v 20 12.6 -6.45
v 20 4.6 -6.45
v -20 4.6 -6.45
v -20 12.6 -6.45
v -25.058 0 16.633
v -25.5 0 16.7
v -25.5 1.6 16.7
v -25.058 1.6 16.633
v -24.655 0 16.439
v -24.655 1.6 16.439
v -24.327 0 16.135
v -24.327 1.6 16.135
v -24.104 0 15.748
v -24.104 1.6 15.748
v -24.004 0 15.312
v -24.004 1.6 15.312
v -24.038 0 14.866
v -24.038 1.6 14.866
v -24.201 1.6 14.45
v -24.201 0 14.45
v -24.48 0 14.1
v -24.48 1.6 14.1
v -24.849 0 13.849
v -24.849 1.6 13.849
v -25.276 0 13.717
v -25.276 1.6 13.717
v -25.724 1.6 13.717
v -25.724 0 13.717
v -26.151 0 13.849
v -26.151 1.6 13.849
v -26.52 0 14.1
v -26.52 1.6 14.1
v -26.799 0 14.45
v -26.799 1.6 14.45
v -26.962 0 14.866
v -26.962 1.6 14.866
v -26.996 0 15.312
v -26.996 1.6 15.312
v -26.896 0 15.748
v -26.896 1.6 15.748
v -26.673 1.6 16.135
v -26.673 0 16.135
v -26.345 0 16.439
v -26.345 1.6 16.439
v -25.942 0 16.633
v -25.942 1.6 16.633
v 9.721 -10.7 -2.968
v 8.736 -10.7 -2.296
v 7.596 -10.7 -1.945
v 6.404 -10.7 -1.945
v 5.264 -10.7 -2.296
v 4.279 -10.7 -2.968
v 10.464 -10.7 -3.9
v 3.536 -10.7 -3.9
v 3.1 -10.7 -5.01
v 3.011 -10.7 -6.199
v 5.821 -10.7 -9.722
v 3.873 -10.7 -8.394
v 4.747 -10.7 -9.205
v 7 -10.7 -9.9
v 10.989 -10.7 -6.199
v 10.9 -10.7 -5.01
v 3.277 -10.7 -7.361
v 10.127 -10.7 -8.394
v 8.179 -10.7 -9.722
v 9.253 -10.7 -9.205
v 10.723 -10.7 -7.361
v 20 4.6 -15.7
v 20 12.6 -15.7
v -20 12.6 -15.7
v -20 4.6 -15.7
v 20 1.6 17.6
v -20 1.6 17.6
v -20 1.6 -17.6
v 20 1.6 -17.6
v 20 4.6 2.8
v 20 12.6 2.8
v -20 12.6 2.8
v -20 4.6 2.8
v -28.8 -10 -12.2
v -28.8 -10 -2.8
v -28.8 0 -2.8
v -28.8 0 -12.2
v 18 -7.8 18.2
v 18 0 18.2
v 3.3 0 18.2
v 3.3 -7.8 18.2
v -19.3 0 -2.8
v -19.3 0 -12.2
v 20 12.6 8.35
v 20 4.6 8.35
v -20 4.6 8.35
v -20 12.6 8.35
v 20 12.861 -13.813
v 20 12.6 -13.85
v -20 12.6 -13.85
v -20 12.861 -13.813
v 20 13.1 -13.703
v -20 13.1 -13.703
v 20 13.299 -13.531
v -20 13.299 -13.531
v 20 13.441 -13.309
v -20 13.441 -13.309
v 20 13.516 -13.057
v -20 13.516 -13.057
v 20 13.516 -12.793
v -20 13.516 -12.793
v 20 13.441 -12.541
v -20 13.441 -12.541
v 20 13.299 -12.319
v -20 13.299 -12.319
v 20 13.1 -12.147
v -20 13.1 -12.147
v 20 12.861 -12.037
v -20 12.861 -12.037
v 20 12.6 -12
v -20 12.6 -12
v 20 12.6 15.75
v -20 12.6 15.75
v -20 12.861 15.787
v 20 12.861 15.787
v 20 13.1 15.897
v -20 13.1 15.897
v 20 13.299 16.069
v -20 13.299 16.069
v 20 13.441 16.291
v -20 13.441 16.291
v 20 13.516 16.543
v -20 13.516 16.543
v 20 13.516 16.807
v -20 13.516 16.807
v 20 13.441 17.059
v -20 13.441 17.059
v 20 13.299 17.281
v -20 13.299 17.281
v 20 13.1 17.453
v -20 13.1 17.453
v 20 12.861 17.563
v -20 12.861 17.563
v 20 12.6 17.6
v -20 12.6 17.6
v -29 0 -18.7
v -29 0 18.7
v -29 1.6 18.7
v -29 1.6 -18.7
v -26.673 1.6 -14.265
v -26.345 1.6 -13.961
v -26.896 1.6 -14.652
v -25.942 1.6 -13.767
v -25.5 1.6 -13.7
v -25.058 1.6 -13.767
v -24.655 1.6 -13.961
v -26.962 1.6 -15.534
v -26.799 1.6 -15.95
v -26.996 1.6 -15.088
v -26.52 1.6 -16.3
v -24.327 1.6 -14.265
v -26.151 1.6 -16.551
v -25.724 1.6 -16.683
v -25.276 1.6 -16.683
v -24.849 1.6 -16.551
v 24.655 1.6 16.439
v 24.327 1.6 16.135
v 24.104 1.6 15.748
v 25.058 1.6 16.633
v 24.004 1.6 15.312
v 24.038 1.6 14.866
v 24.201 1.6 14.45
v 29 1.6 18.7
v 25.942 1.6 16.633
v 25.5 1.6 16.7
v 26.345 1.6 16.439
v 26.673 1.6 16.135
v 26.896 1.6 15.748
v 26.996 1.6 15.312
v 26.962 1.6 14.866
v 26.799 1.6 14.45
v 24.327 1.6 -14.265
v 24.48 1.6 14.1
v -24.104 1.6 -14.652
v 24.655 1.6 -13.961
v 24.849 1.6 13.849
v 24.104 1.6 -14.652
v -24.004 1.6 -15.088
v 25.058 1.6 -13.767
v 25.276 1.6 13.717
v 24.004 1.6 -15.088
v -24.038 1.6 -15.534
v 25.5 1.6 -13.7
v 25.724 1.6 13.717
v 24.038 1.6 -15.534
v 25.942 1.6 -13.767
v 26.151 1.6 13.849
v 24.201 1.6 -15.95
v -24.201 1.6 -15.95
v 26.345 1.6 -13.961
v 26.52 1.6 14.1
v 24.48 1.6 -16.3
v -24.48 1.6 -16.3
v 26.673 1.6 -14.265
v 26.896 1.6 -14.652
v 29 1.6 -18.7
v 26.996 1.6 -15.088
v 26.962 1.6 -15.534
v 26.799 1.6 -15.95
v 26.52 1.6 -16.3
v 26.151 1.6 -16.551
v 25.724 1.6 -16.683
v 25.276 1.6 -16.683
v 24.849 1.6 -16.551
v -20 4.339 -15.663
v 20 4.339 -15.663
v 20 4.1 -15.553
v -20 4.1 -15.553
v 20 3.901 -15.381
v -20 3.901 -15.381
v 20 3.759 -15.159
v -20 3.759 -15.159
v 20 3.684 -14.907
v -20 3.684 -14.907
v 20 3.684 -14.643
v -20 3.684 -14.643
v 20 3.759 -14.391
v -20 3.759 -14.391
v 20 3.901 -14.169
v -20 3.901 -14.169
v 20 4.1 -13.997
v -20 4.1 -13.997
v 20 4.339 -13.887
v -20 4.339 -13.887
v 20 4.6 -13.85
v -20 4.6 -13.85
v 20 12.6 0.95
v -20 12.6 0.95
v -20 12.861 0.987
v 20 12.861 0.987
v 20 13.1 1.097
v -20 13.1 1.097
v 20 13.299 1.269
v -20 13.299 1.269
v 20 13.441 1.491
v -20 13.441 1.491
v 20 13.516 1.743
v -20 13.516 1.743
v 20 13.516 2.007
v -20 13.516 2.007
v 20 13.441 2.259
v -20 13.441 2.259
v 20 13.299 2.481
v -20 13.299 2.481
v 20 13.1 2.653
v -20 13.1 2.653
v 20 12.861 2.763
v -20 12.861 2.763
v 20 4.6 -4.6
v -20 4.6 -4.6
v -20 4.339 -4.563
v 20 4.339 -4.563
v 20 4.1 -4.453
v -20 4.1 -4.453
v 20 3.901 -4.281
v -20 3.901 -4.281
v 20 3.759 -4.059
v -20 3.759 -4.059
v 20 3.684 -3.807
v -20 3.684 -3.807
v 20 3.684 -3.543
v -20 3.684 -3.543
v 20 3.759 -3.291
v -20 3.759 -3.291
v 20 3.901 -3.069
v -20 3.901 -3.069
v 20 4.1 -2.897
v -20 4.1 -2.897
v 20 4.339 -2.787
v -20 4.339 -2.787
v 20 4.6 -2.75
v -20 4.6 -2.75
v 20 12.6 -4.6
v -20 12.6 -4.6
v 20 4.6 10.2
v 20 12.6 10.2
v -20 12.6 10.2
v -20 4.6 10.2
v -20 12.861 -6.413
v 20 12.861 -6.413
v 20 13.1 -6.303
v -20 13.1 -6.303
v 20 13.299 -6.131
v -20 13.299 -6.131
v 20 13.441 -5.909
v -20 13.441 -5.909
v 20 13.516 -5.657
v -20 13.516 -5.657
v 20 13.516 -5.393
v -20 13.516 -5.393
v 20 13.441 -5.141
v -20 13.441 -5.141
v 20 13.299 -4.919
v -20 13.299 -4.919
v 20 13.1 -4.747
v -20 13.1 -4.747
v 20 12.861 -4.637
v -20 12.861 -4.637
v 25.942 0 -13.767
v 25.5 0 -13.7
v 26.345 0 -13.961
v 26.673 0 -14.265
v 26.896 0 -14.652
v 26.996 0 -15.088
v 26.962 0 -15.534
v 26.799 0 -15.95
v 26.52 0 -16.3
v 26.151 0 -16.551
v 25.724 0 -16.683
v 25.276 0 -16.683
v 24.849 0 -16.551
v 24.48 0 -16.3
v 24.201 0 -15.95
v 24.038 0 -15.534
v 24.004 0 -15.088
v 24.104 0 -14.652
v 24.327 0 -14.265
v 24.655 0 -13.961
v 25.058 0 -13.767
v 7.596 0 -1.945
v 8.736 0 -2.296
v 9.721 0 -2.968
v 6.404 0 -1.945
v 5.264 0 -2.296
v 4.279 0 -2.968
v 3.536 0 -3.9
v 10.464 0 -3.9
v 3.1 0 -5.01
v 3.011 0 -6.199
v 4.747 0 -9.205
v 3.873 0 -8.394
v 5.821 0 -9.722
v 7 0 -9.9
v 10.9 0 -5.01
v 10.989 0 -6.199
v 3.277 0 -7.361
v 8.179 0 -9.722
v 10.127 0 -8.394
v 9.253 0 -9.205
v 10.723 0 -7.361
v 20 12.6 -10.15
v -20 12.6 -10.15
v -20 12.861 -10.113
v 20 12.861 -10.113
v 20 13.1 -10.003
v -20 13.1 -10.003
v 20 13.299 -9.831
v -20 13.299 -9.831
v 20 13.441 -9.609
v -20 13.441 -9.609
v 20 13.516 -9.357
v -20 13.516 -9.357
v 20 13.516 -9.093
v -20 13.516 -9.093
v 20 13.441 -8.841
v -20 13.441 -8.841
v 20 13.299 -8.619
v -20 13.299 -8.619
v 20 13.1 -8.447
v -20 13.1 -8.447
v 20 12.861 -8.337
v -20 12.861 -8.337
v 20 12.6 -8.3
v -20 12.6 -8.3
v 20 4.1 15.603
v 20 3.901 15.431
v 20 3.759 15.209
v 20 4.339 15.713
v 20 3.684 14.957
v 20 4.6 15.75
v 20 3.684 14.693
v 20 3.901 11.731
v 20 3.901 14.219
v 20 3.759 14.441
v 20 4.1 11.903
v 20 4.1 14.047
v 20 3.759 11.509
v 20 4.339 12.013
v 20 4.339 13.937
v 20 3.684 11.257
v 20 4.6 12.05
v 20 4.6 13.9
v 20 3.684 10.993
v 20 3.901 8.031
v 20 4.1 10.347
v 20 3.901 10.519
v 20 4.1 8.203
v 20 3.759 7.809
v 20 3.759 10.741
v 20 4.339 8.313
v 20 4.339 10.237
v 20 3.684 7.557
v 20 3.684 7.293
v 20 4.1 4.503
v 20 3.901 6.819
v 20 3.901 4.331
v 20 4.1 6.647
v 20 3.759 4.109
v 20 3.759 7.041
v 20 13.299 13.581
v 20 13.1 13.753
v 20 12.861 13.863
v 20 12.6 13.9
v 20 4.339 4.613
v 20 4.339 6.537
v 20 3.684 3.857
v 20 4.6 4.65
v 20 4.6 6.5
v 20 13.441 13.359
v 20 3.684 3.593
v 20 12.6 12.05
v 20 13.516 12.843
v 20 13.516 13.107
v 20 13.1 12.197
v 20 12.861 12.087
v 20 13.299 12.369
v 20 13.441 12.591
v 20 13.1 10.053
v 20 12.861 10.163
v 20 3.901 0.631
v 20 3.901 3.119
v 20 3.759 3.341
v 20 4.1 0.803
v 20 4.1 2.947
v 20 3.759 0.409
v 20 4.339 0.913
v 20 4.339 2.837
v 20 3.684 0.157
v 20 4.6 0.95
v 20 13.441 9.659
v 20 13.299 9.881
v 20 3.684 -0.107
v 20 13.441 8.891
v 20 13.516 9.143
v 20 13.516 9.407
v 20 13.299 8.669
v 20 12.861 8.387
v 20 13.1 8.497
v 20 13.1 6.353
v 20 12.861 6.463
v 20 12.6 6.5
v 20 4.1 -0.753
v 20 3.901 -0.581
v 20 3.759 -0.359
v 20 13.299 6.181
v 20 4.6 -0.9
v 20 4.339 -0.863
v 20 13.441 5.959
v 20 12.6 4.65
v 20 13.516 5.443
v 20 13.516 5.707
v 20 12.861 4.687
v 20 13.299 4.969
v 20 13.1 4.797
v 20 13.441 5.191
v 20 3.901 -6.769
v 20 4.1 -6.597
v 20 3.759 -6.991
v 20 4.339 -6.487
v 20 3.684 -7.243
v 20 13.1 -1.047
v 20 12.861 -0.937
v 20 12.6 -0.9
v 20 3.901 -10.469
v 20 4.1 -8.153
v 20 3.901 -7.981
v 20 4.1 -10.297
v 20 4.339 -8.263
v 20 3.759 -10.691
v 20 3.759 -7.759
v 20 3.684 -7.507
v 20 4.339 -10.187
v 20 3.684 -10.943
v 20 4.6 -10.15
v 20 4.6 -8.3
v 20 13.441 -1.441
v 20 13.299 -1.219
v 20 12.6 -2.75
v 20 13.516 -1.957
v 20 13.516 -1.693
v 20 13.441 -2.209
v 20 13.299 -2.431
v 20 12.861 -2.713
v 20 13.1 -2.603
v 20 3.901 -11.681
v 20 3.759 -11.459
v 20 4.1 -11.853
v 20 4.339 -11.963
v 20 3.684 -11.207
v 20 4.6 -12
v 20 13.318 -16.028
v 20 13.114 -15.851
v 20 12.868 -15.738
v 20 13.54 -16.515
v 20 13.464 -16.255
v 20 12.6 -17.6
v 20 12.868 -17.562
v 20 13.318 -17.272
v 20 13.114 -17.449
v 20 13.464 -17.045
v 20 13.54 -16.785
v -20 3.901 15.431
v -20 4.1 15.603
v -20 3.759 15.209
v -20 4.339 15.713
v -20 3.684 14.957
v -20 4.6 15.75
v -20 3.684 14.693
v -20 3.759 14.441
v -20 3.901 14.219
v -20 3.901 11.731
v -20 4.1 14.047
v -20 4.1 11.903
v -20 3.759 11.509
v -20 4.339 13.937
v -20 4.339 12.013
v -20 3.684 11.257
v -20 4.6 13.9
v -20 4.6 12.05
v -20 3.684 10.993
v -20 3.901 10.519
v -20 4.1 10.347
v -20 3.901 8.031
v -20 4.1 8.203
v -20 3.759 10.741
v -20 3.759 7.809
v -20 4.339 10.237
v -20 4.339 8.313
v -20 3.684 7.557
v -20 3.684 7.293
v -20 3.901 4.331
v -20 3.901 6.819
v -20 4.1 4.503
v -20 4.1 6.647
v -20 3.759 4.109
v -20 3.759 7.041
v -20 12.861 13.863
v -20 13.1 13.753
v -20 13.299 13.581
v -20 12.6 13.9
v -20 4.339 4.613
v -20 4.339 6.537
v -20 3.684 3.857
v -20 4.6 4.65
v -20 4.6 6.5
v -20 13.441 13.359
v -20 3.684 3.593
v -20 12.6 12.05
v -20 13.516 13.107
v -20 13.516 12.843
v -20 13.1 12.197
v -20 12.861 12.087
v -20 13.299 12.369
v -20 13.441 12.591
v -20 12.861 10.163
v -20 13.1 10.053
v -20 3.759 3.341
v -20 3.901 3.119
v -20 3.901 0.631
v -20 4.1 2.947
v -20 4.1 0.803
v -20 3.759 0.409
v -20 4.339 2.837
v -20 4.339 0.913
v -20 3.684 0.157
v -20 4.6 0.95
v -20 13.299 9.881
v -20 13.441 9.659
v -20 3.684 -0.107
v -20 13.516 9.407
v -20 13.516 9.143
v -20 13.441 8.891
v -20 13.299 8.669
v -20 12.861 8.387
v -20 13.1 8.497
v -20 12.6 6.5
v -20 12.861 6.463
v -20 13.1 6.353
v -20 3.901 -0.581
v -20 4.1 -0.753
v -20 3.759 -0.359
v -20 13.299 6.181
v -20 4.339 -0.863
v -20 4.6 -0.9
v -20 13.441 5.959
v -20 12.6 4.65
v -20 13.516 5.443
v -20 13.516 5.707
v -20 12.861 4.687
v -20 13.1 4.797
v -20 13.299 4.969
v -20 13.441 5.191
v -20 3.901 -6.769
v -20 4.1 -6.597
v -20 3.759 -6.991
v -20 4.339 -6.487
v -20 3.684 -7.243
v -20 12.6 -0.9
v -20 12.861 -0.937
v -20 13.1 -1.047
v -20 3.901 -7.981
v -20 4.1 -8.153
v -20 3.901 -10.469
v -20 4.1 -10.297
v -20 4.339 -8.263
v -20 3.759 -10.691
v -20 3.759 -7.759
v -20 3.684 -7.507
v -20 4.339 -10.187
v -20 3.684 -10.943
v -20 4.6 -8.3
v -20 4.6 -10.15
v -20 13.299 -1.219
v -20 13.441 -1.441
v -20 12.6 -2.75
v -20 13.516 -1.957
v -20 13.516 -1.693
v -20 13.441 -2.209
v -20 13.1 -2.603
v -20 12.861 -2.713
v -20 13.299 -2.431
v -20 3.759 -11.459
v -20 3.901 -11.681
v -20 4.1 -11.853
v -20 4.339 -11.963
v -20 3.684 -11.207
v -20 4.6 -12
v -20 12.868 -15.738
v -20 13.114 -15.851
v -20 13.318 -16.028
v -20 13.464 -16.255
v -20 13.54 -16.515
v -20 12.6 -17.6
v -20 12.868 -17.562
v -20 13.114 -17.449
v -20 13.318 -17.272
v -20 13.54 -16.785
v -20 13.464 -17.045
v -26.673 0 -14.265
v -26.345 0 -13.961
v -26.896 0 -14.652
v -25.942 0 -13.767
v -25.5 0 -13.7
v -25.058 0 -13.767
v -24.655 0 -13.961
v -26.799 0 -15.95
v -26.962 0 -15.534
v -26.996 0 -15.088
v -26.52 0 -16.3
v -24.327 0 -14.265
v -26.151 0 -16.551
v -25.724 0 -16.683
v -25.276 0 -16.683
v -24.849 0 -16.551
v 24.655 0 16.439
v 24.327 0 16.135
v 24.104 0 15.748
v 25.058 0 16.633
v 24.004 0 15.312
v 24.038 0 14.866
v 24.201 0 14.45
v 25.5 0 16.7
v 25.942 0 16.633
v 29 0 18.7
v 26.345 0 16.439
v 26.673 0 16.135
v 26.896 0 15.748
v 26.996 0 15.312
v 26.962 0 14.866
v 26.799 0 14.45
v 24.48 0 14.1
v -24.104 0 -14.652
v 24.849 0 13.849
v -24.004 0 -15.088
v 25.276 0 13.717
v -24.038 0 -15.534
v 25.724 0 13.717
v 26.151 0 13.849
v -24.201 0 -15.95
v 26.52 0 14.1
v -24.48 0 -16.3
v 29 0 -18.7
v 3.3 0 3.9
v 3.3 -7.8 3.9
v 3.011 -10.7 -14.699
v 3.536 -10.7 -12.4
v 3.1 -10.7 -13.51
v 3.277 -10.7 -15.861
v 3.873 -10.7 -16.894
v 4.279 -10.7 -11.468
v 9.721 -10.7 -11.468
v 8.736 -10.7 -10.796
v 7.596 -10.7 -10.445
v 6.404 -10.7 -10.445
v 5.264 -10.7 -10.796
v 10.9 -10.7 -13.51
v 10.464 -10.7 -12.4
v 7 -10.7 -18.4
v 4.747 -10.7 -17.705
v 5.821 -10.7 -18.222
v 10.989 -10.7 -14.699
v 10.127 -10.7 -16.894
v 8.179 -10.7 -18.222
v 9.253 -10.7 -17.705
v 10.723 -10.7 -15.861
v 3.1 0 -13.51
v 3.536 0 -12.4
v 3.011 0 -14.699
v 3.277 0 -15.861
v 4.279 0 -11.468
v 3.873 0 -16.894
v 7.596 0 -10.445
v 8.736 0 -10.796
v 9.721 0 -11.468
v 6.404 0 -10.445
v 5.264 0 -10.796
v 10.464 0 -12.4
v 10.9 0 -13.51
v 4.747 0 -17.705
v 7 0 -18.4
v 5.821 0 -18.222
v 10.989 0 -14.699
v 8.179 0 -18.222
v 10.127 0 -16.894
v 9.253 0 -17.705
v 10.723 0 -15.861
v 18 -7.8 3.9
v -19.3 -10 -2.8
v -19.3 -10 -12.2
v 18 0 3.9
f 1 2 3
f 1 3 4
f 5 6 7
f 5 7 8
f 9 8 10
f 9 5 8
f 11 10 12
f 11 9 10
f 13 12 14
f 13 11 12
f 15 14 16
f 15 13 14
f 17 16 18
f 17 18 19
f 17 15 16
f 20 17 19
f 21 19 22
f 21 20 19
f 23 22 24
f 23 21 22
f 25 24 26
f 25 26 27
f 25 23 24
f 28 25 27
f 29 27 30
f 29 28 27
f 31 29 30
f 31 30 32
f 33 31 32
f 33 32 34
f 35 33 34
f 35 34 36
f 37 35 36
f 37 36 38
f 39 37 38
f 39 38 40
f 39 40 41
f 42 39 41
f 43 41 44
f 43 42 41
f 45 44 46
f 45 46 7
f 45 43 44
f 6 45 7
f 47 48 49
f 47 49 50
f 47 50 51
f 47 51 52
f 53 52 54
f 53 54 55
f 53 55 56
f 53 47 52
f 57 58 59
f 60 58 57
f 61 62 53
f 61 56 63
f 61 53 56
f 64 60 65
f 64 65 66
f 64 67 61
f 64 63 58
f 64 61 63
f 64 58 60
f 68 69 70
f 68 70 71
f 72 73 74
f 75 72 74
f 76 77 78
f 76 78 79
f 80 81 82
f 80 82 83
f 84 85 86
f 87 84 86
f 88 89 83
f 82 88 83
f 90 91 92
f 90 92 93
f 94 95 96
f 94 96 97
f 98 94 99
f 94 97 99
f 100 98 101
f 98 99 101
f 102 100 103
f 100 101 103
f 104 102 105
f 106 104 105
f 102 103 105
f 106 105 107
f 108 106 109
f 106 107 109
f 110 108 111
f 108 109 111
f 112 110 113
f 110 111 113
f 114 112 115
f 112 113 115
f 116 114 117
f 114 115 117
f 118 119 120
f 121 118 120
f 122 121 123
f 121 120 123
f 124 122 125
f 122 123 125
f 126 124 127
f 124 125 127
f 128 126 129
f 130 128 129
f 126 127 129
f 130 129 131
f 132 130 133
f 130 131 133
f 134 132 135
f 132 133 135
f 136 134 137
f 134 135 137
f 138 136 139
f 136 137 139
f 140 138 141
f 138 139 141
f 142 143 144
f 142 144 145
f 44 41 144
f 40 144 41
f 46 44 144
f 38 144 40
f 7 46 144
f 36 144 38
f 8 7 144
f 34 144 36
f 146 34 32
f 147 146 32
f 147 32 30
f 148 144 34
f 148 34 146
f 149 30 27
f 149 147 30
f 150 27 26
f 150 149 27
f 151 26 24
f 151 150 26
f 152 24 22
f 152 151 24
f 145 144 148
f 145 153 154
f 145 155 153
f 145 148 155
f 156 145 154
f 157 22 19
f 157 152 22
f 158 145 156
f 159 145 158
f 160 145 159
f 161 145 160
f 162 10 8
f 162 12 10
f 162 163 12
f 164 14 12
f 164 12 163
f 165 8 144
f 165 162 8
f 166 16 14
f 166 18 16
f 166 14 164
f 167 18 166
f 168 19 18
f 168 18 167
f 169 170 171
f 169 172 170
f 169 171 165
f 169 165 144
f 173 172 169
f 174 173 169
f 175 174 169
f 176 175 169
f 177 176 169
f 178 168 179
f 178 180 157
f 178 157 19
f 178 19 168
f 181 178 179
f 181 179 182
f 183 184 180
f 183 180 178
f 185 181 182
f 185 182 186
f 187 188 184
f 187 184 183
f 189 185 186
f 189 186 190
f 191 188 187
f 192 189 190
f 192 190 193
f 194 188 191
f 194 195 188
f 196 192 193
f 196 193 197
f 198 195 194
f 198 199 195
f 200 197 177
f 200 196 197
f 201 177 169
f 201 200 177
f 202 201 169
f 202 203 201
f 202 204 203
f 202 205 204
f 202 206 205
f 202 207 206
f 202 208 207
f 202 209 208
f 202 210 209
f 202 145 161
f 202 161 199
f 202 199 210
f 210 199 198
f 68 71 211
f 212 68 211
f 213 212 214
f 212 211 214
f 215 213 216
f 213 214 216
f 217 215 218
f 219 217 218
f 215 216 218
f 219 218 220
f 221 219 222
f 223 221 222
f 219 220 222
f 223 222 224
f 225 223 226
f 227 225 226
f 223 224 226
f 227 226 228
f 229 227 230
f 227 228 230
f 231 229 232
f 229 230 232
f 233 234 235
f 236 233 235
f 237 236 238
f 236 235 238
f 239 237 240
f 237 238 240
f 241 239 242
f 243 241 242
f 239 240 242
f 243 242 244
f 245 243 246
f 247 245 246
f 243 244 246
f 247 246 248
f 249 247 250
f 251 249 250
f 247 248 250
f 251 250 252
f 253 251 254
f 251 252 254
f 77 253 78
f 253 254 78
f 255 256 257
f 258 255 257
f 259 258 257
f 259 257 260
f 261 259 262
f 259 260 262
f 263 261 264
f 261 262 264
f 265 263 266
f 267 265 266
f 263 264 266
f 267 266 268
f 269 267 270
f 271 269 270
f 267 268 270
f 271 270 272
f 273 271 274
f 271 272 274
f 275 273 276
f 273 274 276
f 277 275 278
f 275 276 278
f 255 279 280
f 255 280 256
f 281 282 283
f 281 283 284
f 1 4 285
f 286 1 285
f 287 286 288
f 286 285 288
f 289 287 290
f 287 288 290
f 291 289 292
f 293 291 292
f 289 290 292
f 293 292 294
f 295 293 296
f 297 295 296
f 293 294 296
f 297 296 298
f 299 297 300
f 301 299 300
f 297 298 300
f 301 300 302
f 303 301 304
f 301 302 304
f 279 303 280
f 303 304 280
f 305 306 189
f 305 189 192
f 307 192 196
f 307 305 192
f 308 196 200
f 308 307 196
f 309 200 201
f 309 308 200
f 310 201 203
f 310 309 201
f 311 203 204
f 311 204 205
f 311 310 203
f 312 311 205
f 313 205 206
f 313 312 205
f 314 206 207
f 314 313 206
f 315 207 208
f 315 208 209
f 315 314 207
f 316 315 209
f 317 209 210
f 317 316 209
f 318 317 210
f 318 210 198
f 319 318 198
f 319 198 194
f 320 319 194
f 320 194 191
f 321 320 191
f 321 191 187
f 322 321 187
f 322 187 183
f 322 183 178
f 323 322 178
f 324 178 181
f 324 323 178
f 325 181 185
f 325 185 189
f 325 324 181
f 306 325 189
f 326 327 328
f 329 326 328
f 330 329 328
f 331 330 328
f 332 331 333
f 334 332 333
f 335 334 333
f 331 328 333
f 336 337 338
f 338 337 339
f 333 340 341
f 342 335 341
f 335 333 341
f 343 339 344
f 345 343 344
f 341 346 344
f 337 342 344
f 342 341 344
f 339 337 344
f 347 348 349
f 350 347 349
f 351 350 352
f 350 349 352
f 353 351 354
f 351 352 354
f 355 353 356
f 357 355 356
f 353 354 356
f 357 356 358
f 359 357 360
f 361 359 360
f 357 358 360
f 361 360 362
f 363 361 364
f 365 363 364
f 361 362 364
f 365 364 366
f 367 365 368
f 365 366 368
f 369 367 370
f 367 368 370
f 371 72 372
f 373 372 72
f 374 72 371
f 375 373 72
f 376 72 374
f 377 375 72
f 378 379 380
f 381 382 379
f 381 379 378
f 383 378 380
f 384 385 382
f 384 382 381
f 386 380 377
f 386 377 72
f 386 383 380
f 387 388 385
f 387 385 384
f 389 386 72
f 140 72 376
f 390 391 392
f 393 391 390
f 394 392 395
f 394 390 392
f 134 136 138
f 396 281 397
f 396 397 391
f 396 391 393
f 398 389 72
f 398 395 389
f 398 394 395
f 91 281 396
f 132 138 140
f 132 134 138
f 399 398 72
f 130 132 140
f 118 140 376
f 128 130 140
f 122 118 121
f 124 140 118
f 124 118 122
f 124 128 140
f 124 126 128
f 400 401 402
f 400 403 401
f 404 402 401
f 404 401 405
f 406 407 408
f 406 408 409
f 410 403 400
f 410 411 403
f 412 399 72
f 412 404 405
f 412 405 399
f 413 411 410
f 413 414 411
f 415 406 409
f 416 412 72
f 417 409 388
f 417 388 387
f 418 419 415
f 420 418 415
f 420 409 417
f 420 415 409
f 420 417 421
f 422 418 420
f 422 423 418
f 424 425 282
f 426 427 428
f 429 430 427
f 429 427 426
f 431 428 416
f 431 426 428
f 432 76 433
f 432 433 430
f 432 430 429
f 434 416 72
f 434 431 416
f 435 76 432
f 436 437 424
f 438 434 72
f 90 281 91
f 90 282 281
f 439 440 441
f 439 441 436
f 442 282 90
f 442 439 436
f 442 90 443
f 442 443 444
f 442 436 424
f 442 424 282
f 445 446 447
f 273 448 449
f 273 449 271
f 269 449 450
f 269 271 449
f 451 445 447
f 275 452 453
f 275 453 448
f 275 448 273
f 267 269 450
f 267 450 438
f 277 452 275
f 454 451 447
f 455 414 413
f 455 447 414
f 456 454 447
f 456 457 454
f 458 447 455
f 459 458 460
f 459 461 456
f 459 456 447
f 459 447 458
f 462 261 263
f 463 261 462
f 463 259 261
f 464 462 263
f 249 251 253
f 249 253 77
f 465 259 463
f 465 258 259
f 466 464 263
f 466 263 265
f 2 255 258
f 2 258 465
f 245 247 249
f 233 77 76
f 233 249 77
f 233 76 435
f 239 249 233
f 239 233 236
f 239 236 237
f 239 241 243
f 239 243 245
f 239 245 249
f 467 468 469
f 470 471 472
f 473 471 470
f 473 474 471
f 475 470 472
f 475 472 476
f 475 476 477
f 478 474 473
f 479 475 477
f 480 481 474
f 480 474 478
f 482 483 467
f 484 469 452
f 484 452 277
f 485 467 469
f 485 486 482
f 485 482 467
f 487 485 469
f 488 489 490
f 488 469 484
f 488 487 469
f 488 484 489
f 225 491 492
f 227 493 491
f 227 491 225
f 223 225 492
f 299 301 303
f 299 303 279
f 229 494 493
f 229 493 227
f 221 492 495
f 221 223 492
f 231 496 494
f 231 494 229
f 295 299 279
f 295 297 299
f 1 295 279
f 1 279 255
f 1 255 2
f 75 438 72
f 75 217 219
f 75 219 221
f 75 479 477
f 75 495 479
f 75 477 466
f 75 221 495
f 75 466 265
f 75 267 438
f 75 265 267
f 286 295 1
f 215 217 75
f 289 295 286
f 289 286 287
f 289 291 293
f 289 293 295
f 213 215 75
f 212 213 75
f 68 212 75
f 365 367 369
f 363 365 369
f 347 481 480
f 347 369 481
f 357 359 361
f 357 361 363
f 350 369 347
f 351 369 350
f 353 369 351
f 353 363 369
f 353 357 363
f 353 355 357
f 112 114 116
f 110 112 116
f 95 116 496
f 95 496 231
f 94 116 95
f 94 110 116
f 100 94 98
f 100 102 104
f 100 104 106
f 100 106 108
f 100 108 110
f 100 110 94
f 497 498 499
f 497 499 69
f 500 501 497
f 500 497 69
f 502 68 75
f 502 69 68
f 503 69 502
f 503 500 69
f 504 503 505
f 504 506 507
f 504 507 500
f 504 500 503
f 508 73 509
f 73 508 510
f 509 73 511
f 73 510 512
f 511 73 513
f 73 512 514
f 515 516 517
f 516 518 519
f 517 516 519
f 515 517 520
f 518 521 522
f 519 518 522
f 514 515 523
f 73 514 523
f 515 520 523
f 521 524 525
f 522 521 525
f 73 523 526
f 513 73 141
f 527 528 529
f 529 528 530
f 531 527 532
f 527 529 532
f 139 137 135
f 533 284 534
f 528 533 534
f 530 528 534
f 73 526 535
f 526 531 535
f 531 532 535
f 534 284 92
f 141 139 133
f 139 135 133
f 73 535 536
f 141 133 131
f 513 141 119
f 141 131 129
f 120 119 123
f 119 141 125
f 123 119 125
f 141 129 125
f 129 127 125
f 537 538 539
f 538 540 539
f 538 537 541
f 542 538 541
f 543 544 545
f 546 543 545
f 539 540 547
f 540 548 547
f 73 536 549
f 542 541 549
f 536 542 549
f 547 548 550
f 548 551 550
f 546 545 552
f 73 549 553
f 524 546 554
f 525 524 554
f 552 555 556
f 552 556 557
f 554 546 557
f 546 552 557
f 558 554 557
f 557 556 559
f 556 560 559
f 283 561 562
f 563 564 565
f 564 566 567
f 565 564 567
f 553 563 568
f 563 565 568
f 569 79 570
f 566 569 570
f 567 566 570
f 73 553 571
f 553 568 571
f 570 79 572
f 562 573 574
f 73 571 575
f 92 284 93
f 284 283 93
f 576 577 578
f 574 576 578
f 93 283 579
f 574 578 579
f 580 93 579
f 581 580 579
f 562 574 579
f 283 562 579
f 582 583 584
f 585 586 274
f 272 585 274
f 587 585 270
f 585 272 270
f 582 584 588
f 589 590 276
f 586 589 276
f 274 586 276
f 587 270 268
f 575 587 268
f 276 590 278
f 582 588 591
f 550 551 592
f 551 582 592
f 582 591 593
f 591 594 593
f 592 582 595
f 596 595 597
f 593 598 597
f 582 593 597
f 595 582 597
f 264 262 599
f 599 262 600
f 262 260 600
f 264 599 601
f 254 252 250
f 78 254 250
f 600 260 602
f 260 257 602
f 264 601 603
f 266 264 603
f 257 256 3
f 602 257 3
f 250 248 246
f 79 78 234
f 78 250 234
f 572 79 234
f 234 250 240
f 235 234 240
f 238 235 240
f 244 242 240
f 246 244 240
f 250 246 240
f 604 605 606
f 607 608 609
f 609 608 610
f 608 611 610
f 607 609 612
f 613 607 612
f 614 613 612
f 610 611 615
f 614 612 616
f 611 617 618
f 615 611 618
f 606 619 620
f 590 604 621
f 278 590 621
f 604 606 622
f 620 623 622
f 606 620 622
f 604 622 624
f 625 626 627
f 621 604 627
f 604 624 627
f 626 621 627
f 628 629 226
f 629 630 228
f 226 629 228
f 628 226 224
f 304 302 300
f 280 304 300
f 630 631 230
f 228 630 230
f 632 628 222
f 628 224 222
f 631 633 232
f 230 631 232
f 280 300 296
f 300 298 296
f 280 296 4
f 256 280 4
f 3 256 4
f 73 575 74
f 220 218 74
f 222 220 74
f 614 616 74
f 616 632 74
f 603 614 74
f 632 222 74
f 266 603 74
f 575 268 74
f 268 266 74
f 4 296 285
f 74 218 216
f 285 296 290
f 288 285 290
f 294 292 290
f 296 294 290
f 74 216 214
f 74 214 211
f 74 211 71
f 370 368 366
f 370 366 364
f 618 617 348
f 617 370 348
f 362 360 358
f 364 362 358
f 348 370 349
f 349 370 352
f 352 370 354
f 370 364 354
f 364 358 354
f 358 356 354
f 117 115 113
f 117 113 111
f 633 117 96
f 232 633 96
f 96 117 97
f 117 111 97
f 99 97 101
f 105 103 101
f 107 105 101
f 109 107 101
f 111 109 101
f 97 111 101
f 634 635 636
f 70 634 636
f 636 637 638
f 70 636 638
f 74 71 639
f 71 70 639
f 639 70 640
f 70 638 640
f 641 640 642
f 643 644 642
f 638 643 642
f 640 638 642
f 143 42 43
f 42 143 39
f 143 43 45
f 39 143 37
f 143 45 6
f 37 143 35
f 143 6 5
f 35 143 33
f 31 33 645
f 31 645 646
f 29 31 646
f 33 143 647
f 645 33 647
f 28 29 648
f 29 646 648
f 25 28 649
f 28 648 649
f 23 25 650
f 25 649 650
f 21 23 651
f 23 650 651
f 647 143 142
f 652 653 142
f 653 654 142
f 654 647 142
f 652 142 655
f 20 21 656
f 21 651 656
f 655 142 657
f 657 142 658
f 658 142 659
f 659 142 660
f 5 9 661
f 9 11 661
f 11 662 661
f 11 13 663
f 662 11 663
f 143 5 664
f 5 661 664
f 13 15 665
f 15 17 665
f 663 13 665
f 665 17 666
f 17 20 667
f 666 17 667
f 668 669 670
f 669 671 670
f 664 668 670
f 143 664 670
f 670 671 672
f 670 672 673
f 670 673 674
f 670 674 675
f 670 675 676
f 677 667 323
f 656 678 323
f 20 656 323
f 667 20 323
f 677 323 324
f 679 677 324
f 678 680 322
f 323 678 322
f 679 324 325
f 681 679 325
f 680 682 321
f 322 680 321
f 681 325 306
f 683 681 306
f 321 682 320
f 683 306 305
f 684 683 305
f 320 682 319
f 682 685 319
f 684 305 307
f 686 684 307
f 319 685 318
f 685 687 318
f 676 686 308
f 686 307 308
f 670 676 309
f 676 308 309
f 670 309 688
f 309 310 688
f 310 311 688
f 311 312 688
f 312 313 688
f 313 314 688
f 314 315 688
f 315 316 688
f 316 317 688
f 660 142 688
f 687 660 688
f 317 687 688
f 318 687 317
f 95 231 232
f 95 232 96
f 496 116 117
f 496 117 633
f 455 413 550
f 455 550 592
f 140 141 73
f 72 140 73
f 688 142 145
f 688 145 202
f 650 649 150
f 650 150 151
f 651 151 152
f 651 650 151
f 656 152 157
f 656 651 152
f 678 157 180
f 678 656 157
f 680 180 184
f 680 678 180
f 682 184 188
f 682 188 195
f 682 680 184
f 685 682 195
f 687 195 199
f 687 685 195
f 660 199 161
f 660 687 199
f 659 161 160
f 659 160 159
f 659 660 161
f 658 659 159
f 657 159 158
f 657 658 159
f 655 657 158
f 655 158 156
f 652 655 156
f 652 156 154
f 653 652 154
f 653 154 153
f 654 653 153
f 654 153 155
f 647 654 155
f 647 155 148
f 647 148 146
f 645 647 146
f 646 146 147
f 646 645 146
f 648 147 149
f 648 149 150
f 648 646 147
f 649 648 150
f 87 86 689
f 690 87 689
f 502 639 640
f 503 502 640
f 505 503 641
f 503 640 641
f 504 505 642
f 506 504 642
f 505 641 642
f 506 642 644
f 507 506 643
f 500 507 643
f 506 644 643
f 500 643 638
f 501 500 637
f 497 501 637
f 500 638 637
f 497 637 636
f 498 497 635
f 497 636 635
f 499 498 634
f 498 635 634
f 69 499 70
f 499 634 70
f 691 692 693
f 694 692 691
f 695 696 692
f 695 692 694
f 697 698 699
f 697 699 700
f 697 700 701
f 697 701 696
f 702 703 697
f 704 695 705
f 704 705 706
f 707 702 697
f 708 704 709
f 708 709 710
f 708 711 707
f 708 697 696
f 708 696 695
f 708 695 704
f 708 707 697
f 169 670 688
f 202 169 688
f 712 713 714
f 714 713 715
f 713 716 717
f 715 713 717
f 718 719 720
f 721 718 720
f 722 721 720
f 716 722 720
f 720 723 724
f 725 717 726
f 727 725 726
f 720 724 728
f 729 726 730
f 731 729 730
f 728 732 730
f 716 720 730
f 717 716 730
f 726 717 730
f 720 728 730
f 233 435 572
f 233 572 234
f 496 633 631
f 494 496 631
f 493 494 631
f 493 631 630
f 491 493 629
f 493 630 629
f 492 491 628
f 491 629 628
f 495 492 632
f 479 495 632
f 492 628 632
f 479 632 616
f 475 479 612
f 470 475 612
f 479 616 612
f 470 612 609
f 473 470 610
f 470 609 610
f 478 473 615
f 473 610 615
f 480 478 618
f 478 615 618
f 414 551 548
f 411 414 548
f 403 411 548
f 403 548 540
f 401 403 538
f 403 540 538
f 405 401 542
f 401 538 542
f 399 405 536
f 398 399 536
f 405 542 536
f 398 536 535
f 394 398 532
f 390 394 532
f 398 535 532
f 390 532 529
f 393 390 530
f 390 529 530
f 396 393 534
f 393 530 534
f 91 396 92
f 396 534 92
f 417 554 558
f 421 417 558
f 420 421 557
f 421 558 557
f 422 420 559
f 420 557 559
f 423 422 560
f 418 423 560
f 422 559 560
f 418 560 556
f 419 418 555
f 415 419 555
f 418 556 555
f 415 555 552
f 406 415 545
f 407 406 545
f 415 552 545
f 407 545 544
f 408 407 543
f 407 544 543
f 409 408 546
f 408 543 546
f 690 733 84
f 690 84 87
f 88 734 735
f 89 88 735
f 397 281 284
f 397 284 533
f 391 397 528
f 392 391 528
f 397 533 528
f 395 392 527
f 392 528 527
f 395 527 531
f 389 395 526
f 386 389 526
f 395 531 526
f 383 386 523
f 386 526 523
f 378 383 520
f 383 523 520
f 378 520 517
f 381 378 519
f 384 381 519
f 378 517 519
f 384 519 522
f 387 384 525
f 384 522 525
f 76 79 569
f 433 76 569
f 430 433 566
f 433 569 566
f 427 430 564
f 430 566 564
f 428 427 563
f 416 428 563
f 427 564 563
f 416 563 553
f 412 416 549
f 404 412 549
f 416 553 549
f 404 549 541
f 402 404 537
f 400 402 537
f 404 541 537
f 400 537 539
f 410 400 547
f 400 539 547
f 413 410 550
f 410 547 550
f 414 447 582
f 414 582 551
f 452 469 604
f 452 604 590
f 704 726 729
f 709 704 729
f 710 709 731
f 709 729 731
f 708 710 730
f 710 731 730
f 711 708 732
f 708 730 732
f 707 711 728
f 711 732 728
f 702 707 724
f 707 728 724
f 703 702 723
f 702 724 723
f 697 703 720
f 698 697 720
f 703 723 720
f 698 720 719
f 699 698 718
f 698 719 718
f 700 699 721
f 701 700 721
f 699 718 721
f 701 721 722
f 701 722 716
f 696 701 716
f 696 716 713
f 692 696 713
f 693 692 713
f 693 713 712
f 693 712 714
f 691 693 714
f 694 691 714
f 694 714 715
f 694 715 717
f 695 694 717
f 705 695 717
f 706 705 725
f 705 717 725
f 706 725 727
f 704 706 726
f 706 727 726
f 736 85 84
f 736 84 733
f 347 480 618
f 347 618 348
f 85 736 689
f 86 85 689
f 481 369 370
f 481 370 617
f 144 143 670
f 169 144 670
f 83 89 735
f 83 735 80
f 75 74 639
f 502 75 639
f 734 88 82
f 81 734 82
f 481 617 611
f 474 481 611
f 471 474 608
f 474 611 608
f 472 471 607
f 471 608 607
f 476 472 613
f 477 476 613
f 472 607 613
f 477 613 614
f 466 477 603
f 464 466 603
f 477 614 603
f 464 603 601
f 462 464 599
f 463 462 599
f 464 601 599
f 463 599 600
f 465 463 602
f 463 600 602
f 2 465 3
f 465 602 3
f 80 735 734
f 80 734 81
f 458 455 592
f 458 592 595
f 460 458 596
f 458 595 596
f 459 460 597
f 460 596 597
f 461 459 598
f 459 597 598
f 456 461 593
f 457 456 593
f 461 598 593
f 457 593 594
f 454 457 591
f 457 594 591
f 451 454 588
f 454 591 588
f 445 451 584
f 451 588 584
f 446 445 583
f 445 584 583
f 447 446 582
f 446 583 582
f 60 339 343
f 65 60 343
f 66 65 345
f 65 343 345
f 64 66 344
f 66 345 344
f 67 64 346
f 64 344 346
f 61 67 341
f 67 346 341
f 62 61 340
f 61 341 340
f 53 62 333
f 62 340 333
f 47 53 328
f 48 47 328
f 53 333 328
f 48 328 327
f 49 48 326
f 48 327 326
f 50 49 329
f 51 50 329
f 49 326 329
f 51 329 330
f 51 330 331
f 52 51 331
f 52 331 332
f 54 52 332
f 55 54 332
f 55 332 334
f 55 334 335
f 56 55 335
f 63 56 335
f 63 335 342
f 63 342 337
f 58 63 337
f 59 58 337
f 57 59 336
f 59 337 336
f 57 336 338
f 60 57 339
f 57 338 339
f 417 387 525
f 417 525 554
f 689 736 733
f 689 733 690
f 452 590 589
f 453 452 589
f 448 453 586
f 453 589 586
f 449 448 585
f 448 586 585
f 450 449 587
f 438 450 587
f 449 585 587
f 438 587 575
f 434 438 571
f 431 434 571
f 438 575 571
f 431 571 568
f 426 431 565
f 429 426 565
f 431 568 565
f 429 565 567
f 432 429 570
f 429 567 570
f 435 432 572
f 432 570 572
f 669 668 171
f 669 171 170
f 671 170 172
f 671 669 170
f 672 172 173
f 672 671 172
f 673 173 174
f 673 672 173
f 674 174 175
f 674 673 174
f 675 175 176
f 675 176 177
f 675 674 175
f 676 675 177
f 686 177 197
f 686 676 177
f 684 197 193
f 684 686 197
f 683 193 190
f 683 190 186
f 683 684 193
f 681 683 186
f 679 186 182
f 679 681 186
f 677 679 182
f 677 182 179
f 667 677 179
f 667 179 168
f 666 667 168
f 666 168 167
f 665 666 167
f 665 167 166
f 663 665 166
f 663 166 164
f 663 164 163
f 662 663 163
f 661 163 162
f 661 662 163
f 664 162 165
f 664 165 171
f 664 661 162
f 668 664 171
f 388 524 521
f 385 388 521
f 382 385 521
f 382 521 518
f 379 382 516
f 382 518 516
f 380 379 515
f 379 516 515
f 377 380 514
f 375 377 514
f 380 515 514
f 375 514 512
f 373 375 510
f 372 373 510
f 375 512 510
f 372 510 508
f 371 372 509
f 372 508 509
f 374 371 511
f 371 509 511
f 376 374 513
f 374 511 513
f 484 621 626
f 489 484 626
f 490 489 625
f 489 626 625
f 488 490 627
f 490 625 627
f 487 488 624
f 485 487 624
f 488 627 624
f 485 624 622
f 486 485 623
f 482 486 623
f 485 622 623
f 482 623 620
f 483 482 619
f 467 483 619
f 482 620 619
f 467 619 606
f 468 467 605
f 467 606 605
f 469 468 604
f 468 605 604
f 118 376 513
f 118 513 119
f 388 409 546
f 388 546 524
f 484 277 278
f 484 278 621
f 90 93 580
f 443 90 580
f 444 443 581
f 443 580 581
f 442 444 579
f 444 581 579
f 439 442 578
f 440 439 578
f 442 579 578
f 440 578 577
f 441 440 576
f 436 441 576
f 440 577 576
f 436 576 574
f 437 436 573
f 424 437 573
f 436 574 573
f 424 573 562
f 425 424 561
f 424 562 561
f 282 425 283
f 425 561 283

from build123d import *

# Parameters (mm, degrees)
SKETCH1_W                = 58
SKETCH1_H                = 37.4
SKETCH1_R                = 1.5
BOSS_EXTRUDE1_DEPTH      = 1.6
BOSS_EXTRUDE2_DEPTH      = 20
BOSS_EXTRUDE2_DEPTH_BACK = 20
SKETCH3_W                = 14.7
SKETCH3_H                = 14.3
BOSS_EXTRUDE3_DEPTH      = 7.8
SKETCH4_R                = 4
BOSS_EXTRUDE4_DEPTH      = 10.7
BOSS_EXTRUDE4_2_DEPTH    = 10.7
SKETCH5_W                = 9.5
SKETCH5_H                = 9.4
BOSS_EXTRUDE5_DEPTH      = 10


with BuildPart() as part:
    # Sketch1 → Boss-Extrude1 (new body)
    with BuildSketch(Plane(origin=(0, 0, 0), x_dir=(1, 0, 0), z_dir=(0, 1, 0))):
        Rectangle(SKETCH1_W, SKETCH1_H)
        with Locations(Location((25.5, 15.2, 0), (0, 0, 270))):
            Circle(SKETCH1_R, mode=Mode.SUBTRACT)
        with Locations(Location((25.5, -15.2, 0), (0, 0, 270))):
            Circle(SKETCH1_R, mode=Mode.SUBTRACT)
        with Locations(Location((-25.5, -15.2, 0), (0, 0, 270))):
            Circle(SKETCH1_R, mode=Mode.SUBTRACT)
        with Locations(Location((-25.5, 15.2, 0), (0, 0, 270))):
            Circle(SKETCH1_R, mode=Mode.SUBTRACT)
    extrude(amount=BOSS_EXTRUDE1_DEPTH)


with BuildPart() as body_2:
    # Sketch2 → Boss-Extrude2 (new, two sides: drawn at the far end of the back side and taken through both)
    with BuildSketch(Plane(origin=(0, 0, 0), x_dir=(0, 0, -1), z_dir=(1, 0, 0)).offset(-BOSS_EXTRUDE2_DEPTH_BACK)):
        with BuildLine():
            Line((-17.6, 12.6), (-17.6, 1.6))
            Line((-17.6, 1.6), (17.6, 1.6))
            Line((17.6, 1.6), (17.6, 12.6))
            ThreePointArc((17.6, 12.6), (16.65, 13.55), (15.7, 12.6))
            Line((15.7, 12.6), (15.7, 4.6))
            ThreePointArc((15.7, 4.6), (14.775, 3.675), (13.85, 4.6))
            Line((13.85, 4.6), (13.85, 12.6))
            ThreePointArc((13.85, 12.6), (12.925, 13.525), (12, 12.6))
            Line((12, 12.6), (12, 4.6))
            ThreePointArc((12, 4.6), (11.075, 3.675), (10.15, 4.6))
            Line((10.15, 4.6), (10.15, 12.6))
            ThreePointArc((10.15, 12.6), (9.225, 13.525), (8.3, 12.6))
            Line((8.3, 12.6), (8.3, 4.6))
            ThreePointArc((8.3, 4.6), (7.375, 3.675), (6.45, 4.6))
            Line((6.45, 4.6), (6.45, 12.6))
            ThreePointArc((6.45, 12.6), (5.525, 13.525), (4.6, 12.6))
            Line((4.6, 12.6), (4.6, 4.6))
            ThreePointArc((4.6, 4.6), (3.675, 3.675), (2.75, 4.6))
            Line((2.75, 4.6), (2.75, 12.6))
            ThreePointArc((2.75, 12.6), (1.825, 13.525), (0.9, 12.6))
            Line((0.9, 12.6), (0.9, 4.6))
            ThreePointArc((0.9, 4.6), (-0.025, 3.675), (-0.95, 4.6))
            Line((-0.95, 4.6), (-0.95, 12.6))
            ThreePointArc((-0.95, 12.6), (-1.875, 13.525), (-2.8, 12.6))
            Line((-2.8, 12.6), (-2.8, 4.6))
            ThreePointArc((-2.8, 4.6), (-3.725, 3.675), (-4.65, 4.6))
            Line((-4.65, 4.6), (-4.65, 12.6))
            ThreePointArc((-4.65, 12.6), (-5.575, 13.525), (-6.5, 12.6))
            Line((-6.5, 12.6), (-6.5, 4.6))
            ThreePointArc((-6.5, 4.6), (-7.425, 3.675), (-8.35, 4.6))
            Line((-8.35, 4.6), (-8.35, 12.6))
            ThreePointArc((-8.35, 12.6), (-9.275, 13.525), (-10.2, 12.6))
            Line((-10.2, 12.6), (-10.2, 4.6))
            ThreePointArc((-10.2, 4.6), (-11.125, 3.675), (-12.05, 4.6))
            Line((-12.05, 4.6), (-12.05, 12.6))
            Line((-12.05, 12.6), (-13.9, 12.6))
            Line((-13.9, 12.6), (-13.9, 4.6))
            ThreePointArc((-13.9, 4.6), (-14.825, 3.675), (-15.75, 4.6))
            Line((-15.75, 4.6), (-15.75, 12.6))
            ThreePointArc((-15.75, 12.6), (-16.675, 13.525), (-17.6, 12.6))
        make_face()
        with BuildLine():
            ThreePointArc((-12.05, 12.6), (-12.975, 13.525), (-13.9, 12.6))
            Line((-13.9, 12.6), (-12.05, 12.6))
        make_face()
    extrude(amount=BOSS_EXTRUDE2_DEPTH + BOSS_EXTRUDE2_DEPTH_BACK)


with BuildPart() as body_3:
    # Sketch3 → Boss-Extrude3 (new body)
    with BuildSketch(Plane(origin=(0, 0, 0), x_dir=(-1, 0, 0), z_dir=(0, -1, 0))):
        with Locations((-10.65, -11.05)):
            Rectangle(SKETCH3_W, SKETCH3_H)
    extrude(amount=BOSS_EXTRUDE3_DEPTH)


with BuildPart() as body_4:
    # Sketch4 → Boss-Extrude4 (new body)
    with BuildSketch(Plane(origin=(0, 0, 0), x_dir=(-1, 0, 0), z_dir=(0, -1, 0))):
        with Locations(Location((-7, 14.4, 0), (0, 0, 90))):
            Circle(SKETCH4_R)
    extrude(amount=BOSS_EXTRUDE4_DEPTH)


with BuildPart() as body_5:
    # Sketch4 → Boss-Extrude4 2 (new body)
    with BuildSketch(Plane(origin=(0, 0, 0), x_dir=(-1, 0, 0), z_dir=(0, -1, 0))):
        with Locations(Location((-7, 5.9, 0), (0, 0, 90))):
            Circle(SKETCH4_R)
    extrude(amount=BOSS_EXTRUDE4_2_DEPTH)


with BuildPart() as body_6:
    # Sketch5 → Boss-Extrude5 (new body)
    with BuildSketch(Plane(origin=(0, 0, 0), x_dir=(-1, 0, 0), z_dir=(0, -1, 0))):
        with Locations((24.05, 7.5)):
            Rectangle(SKETCH5_W, SKETCH5_H)
    extrude(amount=BOSS_EXTRUDE5_DEPTH)


solid = Compound([part.part, body_2.part, body_3.part, body_4.part, body_5.part, body_6.part])
